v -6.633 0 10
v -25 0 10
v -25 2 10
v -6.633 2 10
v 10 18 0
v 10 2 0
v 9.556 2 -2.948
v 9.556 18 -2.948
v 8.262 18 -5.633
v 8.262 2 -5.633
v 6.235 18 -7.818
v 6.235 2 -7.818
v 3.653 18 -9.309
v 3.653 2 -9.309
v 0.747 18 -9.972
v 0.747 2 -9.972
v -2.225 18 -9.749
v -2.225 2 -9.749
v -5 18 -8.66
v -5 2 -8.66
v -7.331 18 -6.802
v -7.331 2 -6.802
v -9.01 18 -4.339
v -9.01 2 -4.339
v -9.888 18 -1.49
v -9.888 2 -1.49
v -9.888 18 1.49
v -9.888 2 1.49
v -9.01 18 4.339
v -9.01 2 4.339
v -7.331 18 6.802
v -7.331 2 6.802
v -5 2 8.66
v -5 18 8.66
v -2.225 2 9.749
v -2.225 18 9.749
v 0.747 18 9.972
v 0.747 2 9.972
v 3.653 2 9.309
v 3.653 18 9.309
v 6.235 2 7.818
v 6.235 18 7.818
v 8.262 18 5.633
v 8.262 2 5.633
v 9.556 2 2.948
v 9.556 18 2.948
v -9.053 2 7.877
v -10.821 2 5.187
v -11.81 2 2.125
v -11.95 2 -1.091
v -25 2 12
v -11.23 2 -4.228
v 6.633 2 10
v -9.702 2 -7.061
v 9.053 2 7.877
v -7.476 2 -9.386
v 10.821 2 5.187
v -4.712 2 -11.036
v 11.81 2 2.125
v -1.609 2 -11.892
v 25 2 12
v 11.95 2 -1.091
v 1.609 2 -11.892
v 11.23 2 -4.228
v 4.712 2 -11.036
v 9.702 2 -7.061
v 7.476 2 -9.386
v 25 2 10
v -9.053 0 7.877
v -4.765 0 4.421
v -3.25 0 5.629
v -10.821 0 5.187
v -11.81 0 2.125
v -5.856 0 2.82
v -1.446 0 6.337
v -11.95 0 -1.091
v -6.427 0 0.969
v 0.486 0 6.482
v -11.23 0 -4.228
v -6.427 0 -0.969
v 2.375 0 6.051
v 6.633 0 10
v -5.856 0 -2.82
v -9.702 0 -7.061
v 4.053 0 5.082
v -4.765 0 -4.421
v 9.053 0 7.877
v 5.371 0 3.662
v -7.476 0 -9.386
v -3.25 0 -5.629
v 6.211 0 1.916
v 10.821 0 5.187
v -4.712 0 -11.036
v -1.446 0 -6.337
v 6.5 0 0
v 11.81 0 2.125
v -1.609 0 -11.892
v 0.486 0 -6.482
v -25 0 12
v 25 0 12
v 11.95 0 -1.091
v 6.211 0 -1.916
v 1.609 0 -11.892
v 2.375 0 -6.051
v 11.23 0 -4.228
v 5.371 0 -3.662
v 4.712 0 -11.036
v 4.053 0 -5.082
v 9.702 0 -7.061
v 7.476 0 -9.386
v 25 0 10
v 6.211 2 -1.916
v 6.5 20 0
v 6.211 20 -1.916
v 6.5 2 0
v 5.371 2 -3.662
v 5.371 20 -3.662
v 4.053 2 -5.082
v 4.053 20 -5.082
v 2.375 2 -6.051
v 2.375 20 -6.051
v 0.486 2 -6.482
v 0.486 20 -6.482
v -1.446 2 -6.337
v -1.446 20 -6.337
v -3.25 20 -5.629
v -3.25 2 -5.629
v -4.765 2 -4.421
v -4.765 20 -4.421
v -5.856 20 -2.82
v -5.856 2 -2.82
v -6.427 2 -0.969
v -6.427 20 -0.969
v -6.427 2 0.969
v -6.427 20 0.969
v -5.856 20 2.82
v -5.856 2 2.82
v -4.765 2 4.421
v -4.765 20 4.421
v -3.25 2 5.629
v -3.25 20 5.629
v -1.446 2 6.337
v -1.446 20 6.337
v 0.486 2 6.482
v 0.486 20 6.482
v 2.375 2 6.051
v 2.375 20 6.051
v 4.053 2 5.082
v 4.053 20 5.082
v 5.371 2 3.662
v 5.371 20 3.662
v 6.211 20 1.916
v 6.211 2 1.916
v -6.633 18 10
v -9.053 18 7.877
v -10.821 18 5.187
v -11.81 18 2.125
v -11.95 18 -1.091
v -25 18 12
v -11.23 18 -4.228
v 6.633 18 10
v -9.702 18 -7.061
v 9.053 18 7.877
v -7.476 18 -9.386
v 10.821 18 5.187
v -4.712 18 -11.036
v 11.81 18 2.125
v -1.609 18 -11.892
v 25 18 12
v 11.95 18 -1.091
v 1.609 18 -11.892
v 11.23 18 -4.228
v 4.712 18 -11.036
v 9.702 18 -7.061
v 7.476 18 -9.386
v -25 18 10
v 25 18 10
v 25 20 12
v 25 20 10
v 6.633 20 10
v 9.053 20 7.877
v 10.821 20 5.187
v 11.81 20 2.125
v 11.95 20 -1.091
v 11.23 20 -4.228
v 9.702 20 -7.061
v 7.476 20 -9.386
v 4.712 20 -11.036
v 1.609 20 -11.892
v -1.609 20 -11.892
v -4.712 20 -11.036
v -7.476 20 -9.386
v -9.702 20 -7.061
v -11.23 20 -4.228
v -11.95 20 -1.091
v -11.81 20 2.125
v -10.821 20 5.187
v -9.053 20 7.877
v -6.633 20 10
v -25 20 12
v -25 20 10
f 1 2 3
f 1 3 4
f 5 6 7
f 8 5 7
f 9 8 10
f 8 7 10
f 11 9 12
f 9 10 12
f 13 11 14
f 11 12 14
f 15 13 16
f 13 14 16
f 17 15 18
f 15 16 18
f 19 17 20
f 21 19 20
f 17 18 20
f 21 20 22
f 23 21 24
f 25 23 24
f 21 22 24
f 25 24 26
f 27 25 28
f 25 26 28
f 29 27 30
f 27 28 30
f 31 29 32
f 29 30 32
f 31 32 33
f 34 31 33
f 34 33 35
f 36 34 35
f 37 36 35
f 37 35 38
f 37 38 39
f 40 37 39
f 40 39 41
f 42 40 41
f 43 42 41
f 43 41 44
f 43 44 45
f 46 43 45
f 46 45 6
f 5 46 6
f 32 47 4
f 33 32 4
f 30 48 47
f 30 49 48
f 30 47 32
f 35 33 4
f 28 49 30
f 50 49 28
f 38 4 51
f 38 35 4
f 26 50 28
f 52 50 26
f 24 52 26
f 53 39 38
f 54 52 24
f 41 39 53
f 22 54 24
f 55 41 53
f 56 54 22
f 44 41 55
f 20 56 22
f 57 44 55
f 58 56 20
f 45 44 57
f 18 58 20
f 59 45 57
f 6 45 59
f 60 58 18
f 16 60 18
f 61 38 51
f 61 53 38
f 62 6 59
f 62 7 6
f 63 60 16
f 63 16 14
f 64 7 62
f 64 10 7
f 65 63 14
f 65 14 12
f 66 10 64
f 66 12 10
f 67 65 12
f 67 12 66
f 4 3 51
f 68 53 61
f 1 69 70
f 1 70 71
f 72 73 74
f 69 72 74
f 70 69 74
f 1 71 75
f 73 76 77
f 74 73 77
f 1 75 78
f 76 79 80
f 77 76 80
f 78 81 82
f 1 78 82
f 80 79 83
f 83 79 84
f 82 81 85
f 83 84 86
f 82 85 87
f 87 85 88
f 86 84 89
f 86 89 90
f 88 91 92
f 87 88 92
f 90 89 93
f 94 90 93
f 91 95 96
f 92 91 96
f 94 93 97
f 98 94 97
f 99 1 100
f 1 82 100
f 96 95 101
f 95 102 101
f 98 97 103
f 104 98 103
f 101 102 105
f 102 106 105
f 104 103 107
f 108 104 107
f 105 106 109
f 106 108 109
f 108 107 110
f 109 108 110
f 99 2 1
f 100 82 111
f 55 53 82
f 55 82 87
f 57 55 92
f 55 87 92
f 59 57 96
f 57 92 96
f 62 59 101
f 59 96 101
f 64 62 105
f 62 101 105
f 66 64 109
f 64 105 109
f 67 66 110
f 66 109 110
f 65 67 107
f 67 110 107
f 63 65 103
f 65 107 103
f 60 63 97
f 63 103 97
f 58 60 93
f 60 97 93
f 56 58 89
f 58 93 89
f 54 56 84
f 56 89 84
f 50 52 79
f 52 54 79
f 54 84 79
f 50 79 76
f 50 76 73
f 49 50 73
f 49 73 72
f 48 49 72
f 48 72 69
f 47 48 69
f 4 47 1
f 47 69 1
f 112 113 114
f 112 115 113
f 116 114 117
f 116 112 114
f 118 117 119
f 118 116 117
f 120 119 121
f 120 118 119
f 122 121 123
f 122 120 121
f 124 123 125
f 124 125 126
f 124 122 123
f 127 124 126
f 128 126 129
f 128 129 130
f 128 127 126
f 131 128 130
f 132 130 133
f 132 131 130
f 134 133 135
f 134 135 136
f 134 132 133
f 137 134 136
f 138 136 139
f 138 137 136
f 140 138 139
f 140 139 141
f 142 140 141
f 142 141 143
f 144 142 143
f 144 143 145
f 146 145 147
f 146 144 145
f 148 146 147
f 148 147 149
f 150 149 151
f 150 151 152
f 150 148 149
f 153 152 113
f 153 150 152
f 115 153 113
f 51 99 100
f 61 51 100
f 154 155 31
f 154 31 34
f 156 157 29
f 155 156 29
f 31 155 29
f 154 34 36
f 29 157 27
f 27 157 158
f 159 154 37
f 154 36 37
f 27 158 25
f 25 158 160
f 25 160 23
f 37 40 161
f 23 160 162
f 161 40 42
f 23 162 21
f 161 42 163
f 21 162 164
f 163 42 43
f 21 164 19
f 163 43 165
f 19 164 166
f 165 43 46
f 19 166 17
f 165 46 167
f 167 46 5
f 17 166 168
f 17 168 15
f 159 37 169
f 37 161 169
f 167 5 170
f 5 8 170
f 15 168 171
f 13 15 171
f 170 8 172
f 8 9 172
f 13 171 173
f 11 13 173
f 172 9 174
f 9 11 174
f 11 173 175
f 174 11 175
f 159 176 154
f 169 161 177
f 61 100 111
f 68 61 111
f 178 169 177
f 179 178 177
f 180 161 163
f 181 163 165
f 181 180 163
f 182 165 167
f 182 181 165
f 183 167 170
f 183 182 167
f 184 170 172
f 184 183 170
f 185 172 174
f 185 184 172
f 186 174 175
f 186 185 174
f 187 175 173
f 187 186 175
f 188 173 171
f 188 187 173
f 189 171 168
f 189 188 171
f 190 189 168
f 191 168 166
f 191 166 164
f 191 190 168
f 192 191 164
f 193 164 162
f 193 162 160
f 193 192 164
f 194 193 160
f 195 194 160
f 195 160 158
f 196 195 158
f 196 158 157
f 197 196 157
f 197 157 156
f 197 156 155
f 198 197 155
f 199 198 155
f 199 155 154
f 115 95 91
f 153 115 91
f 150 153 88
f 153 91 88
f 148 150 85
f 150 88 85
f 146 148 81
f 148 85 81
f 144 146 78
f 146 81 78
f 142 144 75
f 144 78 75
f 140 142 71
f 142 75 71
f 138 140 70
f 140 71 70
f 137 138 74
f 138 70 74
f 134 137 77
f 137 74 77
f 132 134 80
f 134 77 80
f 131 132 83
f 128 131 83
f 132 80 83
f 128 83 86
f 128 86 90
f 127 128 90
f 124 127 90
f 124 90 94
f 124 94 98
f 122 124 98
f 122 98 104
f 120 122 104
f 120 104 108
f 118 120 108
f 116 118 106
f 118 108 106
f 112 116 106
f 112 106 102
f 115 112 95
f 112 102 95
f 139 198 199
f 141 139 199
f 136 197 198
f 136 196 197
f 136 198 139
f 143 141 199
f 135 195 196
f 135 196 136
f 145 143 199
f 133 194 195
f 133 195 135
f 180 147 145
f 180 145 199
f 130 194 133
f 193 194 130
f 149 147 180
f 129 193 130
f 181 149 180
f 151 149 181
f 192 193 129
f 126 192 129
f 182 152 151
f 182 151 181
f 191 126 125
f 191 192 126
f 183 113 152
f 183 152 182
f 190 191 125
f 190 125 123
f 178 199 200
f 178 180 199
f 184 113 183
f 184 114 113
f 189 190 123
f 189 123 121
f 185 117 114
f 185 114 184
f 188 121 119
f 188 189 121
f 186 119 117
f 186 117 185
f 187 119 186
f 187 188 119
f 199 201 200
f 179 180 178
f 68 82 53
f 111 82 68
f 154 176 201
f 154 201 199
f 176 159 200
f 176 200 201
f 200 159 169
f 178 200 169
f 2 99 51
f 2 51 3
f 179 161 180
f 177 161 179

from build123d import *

# Parameters (mm, degrees)
SKETCH_1_R          = 10
SKETCH_1_R_2        = 6.5
EXTRUDE_1_DEPTH     = 20
SKETCH_1_W          = 50
SKETCH_1_H          = 2
EXTRUDE_1_2_DEPTH   = 20
SKETCH_2_W          = 2
SKETCH_2_H          = 16
CUT_EXTRUDE_2_DEPTH = 50
SKETCH_3_R          = 12
EXTRUDE_2_DEPTH     = 2
SKETCH_5_R          = 12
SKETCH_5_R_2        = 6.5
EXTRUDE_3_DEPTH     = 2
SKETCH_4_R          = 6.5
CUT_EXTRUDE_4_DEPTH = 2


with BuildPart() as part:
    # 草图1 → 凸台-拉伸1 (new body)
    with BuildSketch(Plane(origin=(0, 0, 0), x_dir=(1, 0, 0), z_dir=(0, 1, 0))):
        Circle(SKETCH_1_R)
        Circle(SKETCH_1_R_2, mode=Mode.SUBTRACT)
    extrude(amount=EXTRUDE_1_DEPTH)



with BuildPart() as body_2:
    # 草图1 → Extrude 1 2 (new body)
    with BuildSketch(Plane(origin=(0, 0, 0), x_dir=(1, 0, 0), z_dir=(0, 1, 0))):
        with Locations((0, -11)):
            Rectangle(SKETCH_1_W, SKETCH_1_H)
    extrude(amount=EXTRUDE_1_2_DEPTH)

    # 草图2 → 切除-拉伸2 (cut)
    with BuildSketch(Plane.ZY.offset(25)):
        with Locations((11, 10)):
            Rectangle(SKETCH_2_W, SKETCH_2_H)
    extrude(amount=-CUT_EXTRUDE_2_DEPTH, mode=Mode.SUBTRACT)


with BuildPart() as part_1:
    add(part.part)

    add(body_2.part)  # 凸台-拉伸2 merges body 2
    # 草图3 → 凸台-拉伸2 (add)
    with BuildSketch(Plane(origin=(0, 0, 0), x_dir=(1, 0, 0), z_dir=(0, 1, 0))):
        Circle(SKETCH_3_R)
    extrude(amount=EXTRUDE_2_DEPTH)

    # 草图5 → 凸台-拉伸3 (add)
    with BuildSketch(Plane(origin=(0, 20, 0), x_dir=(1, 0, 0), z_dir=(0, 1, 0))):
        Circle(SKETCH_5_R)
        Circle(SKETCH_5_R_2, mode=Mode.SUBTRACT)
    extrude(amount=-EXTRUDE_3_DEPTH)

    # 草图4 → 切除-拉伸4 (cut)
    with BuildSketch(Plane.XZ):
        Circle(SKETCH_4_R)
    extrude(amount=-CUT_EXTRUDE_4_DEPTH, mode=Mode.SUBTRACT)


solid = part_1.part
